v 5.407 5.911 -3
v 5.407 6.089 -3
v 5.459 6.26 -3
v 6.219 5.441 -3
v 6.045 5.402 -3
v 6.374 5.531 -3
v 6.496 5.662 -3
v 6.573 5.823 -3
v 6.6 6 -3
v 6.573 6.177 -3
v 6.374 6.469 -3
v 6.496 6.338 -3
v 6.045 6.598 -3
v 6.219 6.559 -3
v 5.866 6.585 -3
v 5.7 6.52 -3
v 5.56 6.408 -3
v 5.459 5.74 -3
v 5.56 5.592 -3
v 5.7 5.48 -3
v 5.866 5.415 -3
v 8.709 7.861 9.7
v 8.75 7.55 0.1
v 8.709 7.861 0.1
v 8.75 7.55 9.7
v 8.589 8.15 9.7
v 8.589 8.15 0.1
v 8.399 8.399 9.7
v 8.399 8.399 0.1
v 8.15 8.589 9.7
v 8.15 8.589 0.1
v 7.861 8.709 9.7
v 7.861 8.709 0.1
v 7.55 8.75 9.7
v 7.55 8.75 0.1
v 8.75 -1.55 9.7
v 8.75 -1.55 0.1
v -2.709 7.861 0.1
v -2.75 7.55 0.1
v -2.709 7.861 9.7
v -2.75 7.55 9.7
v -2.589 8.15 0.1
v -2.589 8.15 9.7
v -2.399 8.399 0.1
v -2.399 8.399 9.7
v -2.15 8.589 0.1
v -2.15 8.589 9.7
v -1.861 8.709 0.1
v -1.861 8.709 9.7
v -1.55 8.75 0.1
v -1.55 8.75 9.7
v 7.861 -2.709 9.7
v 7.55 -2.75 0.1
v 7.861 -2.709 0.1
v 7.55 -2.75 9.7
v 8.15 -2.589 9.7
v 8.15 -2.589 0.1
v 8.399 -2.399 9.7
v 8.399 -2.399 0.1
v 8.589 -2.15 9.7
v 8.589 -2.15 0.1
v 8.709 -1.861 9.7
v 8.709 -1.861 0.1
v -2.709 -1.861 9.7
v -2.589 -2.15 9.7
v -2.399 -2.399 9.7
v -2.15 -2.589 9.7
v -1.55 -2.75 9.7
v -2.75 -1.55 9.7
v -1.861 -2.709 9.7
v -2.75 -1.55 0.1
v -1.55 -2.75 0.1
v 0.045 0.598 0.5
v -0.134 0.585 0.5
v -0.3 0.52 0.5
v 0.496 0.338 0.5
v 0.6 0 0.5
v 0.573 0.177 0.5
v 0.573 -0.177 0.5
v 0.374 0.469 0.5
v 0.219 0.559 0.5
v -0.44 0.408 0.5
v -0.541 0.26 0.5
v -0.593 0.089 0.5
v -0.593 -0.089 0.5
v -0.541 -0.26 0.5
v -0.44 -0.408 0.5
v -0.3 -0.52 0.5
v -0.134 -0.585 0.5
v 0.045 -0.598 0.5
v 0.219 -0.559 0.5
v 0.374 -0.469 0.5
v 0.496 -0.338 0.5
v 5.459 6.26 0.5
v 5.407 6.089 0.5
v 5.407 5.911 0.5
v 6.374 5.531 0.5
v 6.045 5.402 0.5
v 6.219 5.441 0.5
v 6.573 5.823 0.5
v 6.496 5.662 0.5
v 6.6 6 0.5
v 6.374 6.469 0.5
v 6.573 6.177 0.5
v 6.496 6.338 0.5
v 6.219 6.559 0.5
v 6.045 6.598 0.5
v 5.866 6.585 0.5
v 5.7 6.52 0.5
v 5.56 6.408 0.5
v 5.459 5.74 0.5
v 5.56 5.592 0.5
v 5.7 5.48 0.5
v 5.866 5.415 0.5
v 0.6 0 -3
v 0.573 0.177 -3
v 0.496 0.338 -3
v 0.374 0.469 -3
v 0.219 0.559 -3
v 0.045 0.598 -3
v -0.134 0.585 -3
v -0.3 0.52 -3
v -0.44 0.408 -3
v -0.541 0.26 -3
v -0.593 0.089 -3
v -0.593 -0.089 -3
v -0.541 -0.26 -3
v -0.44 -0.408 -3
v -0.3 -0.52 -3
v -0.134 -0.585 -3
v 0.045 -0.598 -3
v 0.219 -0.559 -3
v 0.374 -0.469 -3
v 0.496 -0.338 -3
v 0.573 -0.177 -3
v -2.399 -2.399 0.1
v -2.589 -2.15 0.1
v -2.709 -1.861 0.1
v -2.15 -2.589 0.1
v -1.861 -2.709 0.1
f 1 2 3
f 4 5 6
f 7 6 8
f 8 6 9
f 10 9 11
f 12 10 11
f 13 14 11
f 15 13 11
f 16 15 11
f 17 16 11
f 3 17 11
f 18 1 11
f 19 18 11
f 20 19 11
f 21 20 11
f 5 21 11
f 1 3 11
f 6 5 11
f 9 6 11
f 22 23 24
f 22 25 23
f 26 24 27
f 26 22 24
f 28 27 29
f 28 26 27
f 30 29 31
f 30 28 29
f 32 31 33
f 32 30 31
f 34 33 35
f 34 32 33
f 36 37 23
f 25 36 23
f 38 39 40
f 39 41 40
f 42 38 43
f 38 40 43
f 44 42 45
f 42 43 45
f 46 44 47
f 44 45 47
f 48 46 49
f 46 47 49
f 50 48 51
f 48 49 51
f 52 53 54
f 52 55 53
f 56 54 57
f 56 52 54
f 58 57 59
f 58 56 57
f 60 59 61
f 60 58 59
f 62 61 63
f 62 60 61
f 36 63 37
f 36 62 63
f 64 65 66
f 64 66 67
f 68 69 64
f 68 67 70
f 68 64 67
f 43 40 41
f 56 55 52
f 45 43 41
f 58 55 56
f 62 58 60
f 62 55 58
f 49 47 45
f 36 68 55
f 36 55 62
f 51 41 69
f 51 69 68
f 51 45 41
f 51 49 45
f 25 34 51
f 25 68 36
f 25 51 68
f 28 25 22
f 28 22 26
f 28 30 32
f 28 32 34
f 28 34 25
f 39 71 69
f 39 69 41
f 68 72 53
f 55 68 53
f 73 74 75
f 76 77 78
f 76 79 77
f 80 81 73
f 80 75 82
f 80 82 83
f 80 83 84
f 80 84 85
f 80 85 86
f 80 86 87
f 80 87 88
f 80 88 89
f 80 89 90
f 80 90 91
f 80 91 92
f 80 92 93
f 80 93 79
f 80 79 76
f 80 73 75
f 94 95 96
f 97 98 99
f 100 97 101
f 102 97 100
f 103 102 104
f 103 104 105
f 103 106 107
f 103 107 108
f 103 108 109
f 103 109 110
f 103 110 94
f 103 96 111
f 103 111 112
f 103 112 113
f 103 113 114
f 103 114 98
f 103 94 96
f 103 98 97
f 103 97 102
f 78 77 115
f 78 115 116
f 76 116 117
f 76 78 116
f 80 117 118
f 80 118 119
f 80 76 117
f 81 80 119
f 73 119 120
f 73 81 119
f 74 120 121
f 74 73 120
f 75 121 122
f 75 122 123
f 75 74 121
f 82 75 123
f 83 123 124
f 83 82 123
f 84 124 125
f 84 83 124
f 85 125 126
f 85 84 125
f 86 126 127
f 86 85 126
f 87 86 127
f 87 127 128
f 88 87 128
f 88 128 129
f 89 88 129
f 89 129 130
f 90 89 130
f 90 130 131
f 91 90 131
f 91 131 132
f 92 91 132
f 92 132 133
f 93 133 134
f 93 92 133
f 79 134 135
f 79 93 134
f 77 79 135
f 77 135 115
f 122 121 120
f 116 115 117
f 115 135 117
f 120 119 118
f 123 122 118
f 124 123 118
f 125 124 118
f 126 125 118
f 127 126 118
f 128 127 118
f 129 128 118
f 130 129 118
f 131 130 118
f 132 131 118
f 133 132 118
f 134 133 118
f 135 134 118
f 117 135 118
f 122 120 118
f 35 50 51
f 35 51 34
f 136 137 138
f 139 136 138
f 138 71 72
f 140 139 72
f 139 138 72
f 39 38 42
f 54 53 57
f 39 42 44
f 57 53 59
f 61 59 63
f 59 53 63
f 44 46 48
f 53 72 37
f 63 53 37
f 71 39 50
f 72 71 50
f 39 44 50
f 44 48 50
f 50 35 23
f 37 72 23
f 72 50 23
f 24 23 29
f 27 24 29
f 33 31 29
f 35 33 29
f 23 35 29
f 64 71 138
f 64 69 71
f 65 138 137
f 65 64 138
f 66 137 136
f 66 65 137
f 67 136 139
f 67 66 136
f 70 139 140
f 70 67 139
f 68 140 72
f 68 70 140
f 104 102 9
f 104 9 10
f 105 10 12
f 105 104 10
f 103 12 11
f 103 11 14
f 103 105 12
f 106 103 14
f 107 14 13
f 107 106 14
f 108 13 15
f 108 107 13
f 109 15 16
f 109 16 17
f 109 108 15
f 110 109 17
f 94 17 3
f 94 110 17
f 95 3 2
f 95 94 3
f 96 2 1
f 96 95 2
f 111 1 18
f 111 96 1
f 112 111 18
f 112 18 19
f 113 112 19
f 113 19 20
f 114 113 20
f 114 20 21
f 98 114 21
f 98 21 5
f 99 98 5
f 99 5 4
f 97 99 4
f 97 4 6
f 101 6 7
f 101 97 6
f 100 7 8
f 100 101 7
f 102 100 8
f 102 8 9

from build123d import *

# Parameters (mm, degrees)
SKETCH001_R  = 0.6
PAD001_DEPTH = 3.5
SKETCH_W     = 11.5
SKETCH_H     = 11.5
PAD_DEPTH    = 9.6
FILLET_R     = 1.2


with BuildPart() as pad001:
    # Sketch001 → Pad001 (new body)
    with BuildSketch(Plane.XY.offset(0.5)):
        Circle(SKETCH001_R)
        with Locations((6, 6)):
            Circle(SKETCH001_R)
    extrude(amount=-PAD001_DEPTH)


with BuildPart() as fillet_body:
    # Sketch → Pad (new body)
    with BuildSketch(Plane.XY.offset(0.1)):
        with Locations((3, 3)):
            Rectangle(SKETCH_W, SKETCH_H)
    extrude(amount=PAD_DEPTH)

    # Fillet
    fillet_edges = [fillet_body.edges().sort_by_distance(p)[0] for p in [
        (8.75, -2.75, 4.9),
        (8.75, 8.75, 4.9),
        (-2.75, -2.75, 4.9),
        (-2.75, 8.75, 4.9),
    ]]
    fillet(fillet_edges, radius=FILLET_R)


solid = Compound([pad001.part, fillet_body.part])
